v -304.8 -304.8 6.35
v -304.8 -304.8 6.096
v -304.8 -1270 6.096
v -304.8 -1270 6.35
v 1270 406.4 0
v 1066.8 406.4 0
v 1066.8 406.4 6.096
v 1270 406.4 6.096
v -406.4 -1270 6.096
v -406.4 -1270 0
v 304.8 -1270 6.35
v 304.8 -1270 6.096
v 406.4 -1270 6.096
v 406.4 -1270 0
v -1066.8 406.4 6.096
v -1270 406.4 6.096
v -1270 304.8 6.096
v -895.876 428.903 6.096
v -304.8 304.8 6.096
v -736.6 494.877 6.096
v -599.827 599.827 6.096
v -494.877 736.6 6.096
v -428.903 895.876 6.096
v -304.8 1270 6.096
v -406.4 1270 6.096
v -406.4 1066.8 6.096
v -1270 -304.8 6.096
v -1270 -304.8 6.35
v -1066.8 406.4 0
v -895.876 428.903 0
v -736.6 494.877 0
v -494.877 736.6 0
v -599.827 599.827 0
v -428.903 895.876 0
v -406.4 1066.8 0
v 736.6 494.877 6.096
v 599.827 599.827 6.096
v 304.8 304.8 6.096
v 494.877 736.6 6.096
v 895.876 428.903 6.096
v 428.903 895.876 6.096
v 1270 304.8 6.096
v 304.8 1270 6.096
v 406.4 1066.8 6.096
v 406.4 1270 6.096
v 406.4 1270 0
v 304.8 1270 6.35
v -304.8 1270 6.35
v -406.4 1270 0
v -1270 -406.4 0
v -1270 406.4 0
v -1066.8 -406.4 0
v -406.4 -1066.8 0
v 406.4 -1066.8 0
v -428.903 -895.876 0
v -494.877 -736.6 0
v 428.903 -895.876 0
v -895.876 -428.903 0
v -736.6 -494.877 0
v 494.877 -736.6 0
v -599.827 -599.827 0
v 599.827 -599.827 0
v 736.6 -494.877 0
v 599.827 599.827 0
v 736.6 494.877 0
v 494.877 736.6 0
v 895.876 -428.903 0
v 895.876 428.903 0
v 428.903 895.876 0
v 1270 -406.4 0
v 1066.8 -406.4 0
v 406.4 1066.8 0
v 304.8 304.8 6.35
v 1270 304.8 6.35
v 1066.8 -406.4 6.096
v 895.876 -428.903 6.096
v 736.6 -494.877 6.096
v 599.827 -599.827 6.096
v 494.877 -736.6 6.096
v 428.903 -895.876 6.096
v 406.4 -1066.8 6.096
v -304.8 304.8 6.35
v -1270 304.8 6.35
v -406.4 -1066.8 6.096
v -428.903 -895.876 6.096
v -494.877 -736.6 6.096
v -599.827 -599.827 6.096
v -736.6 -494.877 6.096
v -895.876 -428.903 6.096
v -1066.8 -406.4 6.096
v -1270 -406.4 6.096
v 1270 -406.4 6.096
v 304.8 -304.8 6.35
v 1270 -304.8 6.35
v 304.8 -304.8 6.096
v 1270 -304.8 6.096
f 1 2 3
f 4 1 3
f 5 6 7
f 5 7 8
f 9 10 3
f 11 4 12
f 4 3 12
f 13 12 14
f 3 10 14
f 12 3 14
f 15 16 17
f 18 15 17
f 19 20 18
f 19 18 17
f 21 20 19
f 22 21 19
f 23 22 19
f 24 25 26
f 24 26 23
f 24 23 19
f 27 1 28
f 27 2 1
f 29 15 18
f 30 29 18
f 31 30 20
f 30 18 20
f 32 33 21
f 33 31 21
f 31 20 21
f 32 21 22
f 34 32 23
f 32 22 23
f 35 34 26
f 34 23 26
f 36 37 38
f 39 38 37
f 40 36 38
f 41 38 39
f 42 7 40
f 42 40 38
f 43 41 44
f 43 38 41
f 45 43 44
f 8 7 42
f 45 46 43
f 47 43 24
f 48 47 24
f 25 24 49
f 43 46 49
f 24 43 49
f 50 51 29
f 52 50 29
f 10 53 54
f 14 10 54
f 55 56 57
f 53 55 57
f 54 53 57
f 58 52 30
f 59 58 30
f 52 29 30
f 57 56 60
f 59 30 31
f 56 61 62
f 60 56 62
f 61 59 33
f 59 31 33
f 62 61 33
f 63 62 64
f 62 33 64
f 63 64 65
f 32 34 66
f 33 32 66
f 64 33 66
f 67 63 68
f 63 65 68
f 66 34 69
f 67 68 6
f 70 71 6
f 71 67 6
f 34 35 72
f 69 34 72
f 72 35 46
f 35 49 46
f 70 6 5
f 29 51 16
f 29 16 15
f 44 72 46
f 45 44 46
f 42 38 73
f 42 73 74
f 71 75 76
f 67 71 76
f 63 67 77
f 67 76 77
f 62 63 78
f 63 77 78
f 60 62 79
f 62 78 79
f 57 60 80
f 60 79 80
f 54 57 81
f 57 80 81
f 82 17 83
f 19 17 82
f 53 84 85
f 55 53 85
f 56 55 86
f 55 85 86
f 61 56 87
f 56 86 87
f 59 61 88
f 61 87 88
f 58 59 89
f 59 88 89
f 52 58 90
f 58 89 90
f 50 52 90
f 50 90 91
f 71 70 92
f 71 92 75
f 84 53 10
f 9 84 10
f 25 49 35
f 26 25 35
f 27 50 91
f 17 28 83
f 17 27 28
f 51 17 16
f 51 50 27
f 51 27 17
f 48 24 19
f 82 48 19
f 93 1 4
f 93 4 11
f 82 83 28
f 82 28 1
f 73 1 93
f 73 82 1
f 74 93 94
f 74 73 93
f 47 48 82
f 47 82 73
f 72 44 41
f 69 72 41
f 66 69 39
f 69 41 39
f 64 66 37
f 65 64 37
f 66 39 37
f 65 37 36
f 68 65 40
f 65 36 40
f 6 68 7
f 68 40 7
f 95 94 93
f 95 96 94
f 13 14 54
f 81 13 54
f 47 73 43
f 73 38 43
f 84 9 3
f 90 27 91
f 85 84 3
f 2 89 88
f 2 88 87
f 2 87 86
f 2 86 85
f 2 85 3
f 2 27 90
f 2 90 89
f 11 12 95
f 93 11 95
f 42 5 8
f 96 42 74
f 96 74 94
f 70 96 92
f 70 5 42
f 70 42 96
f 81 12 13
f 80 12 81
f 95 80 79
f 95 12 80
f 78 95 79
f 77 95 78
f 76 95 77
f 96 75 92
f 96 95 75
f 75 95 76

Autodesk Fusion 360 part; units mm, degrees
sketch "Sketch1" plane through (0, 0, 0) normal (0, 0, 1) x (1, 0, 0)
  line L0 (406.4, 1270) -> (-406.4, 1270)
  line L1 (-406.4, 1270) -> (-406.4, -1270)
  line L2 (-406.4, -1270) -> (406.4, -1270)
  line L3 (406.4, -1270) -> (406.4, 1270)
  line L4 (406.4, 1270) -> (-406.4, -1270) construction
  line L5 (-406.4, 1270) -> (406.4, -1270) construction
  line L6 (-1270, 406.4) -> (1270, 406.4)
  line L7 (1270, 406.4) -> (1270, -406.4)
  line L8 (1270, -406.4) -> (-1270, -406.4)
  line L9 (-1270, -406.4) -> (-1270, 406.4)
  line L10 (-1270, 406.4) -> (1270, -406.4) construction
  line L11 (1270, 406.4) -> (-1270, -406.4) construction
  line L12 (-1270, 304.8) -> (1270, 304.8)
  line L13 (1270, 304.8) -> (1270, -304.8)
  line L14 (1270, -304.8) -> (-1270, -304.8)
  line L15 (-1270, -304.8) -> (-1270, 304.8)
  line L16 (-1270, 304.8) -> (1270, -304.8) construction
  line L17 (1270, 304.8) -> (-1270, -304.8) construction
  line L18 (304.8, 1270) -> (-304.8, 1270)
  line L19 (-304.8, 1270) -> (-304.8, -1270)
  line L20 (-304.8, -1270) -> (304.8, -1270)
  line L21 (304.8, -1270) -> (304.8, 1270)
  line L22 (304.8, 1270) -> (-304.8, -1270) construction
  line L23 (-304.8, 1270) -> (304.8, -1270) construction
  dimension "d3" = 812.8
  dimension "d4" = 2540
  dimension "d5" = 2540
  dimension "d6" = 609.6
  dimension "d7" = 609.6
extrude "Extrude1" add sketch "Sketch1" along normal blind 6.35 contours L0 L6 L18 L19 L21 | L6 L12 L19 L21 | L3 L7 L12 L13 L14 | L3 L12 L14 L21 | L12 L14 L19 L21 | L1 L12 L14 L19 | L8 L14 L19 L21 | L1 L9 L12 L14 L15 | L2 L8 L19 L20 L21
extrude "Extrude2" add sketch "Sketch1" along normal blind 6.096 contours L0 L3 L6 L21 | L3 L6 L7 L12 | L3 L6 L12 L21 | L0 L1 L6 L19 | L1 L6 L12 L19 | L3 L7 L8 L14 | L3 L8 L14 L21 | L1 L6 L9 L12 | L2 L3 L8 L21 | L1 L8 L14 L19 | L1 L8 L9 L14 | L1 L2 L8 L19
fillet "Fillet1" radius 660.4 4 edges at (-406.4, -406.4, 3.048) (406.4, -406.4, 3.048) (406.4, 406.4, 3.048) (-406.4, 406.4, 3.048)
